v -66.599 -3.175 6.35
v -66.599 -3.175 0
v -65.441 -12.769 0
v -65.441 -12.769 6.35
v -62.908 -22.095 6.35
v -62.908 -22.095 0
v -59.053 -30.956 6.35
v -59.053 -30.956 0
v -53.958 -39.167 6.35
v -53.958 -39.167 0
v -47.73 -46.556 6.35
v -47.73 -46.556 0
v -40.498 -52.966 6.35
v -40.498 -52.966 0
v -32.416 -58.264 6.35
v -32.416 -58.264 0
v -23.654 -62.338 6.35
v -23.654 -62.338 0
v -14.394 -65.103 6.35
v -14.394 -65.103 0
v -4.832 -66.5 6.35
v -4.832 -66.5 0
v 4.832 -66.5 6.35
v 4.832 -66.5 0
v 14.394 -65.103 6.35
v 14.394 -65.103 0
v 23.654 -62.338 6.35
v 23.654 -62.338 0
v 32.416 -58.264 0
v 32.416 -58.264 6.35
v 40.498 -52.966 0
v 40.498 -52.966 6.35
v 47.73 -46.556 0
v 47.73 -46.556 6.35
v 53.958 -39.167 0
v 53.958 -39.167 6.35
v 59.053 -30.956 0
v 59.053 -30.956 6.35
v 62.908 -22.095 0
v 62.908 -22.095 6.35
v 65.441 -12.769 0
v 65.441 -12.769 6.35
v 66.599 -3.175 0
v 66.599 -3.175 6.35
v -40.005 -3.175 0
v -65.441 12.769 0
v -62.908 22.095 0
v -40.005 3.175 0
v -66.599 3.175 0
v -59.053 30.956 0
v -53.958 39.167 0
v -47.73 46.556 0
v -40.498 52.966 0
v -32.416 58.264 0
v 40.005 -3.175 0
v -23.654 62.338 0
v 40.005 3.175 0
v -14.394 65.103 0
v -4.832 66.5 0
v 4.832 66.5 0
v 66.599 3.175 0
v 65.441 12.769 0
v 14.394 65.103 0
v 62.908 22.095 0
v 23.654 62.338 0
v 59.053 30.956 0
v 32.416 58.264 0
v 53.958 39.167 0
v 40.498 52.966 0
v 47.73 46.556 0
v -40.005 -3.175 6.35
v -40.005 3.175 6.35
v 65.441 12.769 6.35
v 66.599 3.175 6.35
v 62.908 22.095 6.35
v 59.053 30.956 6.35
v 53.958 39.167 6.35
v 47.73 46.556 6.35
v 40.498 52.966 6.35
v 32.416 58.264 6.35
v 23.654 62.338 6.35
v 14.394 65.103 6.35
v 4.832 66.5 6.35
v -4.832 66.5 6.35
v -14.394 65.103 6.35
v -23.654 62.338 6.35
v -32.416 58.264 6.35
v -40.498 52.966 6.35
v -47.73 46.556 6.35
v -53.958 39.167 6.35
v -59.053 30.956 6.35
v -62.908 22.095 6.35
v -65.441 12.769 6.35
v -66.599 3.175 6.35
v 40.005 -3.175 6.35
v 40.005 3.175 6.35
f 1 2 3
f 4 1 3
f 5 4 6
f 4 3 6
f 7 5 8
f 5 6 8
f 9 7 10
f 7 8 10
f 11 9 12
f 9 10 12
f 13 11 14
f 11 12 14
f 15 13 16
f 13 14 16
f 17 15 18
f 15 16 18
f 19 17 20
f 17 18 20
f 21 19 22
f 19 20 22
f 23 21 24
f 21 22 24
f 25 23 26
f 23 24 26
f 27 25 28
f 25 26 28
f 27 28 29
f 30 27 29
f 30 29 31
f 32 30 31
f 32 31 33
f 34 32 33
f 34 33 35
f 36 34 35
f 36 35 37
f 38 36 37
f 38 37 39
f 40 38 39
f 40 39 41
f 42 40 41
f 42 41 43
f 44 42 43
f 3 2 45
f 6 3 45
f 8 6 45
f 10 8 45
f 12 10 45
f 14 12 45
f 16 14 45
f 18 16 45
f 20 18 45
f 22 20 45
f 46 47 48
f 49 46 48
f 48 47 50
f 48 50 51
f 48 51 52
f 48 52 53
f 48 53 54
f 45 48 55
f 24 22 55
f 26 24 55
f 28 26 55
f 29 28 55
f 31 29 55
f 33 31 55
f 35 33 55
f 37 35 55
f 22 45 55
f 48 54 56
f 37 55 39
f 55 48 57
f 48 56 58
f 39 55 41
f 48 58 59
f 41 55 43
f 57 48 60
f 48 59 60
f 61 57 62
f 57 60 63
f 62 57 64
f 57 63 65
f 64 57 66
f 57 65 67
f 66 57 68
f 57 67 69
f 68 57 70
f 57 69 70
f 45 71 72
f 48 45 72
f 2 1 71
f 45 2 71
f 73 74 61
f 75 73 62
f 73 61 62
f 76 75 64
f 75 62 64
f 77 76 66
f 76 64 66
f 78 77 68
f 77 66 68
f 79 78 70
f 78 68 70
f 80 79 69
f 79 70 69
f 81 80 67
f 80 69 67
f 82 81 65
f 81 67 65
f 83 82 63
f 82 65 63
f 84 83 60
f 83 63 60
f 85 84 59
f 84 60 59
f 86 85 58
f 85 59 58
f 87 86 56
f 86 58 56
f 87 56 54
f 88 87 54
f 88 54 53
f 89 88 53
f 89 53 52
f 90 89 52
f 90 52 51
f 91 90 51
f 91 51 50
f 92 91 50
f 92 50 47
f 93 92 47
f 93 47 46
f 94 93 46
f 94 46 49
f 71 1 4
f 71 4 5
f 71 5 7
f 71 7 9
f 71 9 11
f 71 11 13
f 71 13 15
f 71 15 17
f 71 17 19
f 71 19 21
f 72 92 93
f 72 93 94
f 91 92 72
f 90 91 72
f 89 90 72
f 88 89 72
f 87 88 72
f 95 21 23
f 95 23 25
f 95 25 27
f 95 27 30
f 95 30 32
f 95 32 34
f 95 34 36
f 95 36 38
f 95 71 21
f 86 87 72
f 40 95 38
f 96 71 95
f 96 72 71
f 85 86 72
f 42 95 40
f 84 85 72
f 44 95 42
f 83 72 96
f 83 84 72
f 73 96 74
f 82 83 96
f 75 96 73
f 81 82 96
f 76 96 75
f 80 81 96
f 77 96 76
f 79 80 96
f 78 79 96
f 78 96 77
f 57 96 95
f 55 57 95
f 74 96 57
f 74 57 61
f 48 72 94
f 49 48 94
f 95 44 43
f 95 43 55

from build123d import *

# Parameters (mm, degrees)
SKETCH1_R           = 66.675
BOSS_EXTRUDE1_DEPTH = 6.35
CUT_EXTRUDE1_DEPTH  = 7.35


with BuildPart() as part:
    # Sketch1 → Boss-Extrude1 (new body)
    with BuildSketch(Plane.XY):
        Circle(SKETCH1_R)
    extrude(amount=BOSS_EXTRUDE1_DEPTH)

    # Sketch2 → Cut-Extrude1 (cut, through all)
    with BuildSketch(Plane.XY.offset(6.35)):
        Polygon((-40.005, 0), (-40.005, 3.175), (-67.945, 3.175), (-67.945, -3.175), (-40.005, -3.175), align=None)
        Polygon((40.005, -3.175), (40.005, 0), (40.005, 3.175), (67.945, 3.175), (67.945, -3.175), align=None)
    extrude(amount=-CUT_EXTRUDE1_DEPTH, mode=Mode.SUBTRACT)


solid = part.part
